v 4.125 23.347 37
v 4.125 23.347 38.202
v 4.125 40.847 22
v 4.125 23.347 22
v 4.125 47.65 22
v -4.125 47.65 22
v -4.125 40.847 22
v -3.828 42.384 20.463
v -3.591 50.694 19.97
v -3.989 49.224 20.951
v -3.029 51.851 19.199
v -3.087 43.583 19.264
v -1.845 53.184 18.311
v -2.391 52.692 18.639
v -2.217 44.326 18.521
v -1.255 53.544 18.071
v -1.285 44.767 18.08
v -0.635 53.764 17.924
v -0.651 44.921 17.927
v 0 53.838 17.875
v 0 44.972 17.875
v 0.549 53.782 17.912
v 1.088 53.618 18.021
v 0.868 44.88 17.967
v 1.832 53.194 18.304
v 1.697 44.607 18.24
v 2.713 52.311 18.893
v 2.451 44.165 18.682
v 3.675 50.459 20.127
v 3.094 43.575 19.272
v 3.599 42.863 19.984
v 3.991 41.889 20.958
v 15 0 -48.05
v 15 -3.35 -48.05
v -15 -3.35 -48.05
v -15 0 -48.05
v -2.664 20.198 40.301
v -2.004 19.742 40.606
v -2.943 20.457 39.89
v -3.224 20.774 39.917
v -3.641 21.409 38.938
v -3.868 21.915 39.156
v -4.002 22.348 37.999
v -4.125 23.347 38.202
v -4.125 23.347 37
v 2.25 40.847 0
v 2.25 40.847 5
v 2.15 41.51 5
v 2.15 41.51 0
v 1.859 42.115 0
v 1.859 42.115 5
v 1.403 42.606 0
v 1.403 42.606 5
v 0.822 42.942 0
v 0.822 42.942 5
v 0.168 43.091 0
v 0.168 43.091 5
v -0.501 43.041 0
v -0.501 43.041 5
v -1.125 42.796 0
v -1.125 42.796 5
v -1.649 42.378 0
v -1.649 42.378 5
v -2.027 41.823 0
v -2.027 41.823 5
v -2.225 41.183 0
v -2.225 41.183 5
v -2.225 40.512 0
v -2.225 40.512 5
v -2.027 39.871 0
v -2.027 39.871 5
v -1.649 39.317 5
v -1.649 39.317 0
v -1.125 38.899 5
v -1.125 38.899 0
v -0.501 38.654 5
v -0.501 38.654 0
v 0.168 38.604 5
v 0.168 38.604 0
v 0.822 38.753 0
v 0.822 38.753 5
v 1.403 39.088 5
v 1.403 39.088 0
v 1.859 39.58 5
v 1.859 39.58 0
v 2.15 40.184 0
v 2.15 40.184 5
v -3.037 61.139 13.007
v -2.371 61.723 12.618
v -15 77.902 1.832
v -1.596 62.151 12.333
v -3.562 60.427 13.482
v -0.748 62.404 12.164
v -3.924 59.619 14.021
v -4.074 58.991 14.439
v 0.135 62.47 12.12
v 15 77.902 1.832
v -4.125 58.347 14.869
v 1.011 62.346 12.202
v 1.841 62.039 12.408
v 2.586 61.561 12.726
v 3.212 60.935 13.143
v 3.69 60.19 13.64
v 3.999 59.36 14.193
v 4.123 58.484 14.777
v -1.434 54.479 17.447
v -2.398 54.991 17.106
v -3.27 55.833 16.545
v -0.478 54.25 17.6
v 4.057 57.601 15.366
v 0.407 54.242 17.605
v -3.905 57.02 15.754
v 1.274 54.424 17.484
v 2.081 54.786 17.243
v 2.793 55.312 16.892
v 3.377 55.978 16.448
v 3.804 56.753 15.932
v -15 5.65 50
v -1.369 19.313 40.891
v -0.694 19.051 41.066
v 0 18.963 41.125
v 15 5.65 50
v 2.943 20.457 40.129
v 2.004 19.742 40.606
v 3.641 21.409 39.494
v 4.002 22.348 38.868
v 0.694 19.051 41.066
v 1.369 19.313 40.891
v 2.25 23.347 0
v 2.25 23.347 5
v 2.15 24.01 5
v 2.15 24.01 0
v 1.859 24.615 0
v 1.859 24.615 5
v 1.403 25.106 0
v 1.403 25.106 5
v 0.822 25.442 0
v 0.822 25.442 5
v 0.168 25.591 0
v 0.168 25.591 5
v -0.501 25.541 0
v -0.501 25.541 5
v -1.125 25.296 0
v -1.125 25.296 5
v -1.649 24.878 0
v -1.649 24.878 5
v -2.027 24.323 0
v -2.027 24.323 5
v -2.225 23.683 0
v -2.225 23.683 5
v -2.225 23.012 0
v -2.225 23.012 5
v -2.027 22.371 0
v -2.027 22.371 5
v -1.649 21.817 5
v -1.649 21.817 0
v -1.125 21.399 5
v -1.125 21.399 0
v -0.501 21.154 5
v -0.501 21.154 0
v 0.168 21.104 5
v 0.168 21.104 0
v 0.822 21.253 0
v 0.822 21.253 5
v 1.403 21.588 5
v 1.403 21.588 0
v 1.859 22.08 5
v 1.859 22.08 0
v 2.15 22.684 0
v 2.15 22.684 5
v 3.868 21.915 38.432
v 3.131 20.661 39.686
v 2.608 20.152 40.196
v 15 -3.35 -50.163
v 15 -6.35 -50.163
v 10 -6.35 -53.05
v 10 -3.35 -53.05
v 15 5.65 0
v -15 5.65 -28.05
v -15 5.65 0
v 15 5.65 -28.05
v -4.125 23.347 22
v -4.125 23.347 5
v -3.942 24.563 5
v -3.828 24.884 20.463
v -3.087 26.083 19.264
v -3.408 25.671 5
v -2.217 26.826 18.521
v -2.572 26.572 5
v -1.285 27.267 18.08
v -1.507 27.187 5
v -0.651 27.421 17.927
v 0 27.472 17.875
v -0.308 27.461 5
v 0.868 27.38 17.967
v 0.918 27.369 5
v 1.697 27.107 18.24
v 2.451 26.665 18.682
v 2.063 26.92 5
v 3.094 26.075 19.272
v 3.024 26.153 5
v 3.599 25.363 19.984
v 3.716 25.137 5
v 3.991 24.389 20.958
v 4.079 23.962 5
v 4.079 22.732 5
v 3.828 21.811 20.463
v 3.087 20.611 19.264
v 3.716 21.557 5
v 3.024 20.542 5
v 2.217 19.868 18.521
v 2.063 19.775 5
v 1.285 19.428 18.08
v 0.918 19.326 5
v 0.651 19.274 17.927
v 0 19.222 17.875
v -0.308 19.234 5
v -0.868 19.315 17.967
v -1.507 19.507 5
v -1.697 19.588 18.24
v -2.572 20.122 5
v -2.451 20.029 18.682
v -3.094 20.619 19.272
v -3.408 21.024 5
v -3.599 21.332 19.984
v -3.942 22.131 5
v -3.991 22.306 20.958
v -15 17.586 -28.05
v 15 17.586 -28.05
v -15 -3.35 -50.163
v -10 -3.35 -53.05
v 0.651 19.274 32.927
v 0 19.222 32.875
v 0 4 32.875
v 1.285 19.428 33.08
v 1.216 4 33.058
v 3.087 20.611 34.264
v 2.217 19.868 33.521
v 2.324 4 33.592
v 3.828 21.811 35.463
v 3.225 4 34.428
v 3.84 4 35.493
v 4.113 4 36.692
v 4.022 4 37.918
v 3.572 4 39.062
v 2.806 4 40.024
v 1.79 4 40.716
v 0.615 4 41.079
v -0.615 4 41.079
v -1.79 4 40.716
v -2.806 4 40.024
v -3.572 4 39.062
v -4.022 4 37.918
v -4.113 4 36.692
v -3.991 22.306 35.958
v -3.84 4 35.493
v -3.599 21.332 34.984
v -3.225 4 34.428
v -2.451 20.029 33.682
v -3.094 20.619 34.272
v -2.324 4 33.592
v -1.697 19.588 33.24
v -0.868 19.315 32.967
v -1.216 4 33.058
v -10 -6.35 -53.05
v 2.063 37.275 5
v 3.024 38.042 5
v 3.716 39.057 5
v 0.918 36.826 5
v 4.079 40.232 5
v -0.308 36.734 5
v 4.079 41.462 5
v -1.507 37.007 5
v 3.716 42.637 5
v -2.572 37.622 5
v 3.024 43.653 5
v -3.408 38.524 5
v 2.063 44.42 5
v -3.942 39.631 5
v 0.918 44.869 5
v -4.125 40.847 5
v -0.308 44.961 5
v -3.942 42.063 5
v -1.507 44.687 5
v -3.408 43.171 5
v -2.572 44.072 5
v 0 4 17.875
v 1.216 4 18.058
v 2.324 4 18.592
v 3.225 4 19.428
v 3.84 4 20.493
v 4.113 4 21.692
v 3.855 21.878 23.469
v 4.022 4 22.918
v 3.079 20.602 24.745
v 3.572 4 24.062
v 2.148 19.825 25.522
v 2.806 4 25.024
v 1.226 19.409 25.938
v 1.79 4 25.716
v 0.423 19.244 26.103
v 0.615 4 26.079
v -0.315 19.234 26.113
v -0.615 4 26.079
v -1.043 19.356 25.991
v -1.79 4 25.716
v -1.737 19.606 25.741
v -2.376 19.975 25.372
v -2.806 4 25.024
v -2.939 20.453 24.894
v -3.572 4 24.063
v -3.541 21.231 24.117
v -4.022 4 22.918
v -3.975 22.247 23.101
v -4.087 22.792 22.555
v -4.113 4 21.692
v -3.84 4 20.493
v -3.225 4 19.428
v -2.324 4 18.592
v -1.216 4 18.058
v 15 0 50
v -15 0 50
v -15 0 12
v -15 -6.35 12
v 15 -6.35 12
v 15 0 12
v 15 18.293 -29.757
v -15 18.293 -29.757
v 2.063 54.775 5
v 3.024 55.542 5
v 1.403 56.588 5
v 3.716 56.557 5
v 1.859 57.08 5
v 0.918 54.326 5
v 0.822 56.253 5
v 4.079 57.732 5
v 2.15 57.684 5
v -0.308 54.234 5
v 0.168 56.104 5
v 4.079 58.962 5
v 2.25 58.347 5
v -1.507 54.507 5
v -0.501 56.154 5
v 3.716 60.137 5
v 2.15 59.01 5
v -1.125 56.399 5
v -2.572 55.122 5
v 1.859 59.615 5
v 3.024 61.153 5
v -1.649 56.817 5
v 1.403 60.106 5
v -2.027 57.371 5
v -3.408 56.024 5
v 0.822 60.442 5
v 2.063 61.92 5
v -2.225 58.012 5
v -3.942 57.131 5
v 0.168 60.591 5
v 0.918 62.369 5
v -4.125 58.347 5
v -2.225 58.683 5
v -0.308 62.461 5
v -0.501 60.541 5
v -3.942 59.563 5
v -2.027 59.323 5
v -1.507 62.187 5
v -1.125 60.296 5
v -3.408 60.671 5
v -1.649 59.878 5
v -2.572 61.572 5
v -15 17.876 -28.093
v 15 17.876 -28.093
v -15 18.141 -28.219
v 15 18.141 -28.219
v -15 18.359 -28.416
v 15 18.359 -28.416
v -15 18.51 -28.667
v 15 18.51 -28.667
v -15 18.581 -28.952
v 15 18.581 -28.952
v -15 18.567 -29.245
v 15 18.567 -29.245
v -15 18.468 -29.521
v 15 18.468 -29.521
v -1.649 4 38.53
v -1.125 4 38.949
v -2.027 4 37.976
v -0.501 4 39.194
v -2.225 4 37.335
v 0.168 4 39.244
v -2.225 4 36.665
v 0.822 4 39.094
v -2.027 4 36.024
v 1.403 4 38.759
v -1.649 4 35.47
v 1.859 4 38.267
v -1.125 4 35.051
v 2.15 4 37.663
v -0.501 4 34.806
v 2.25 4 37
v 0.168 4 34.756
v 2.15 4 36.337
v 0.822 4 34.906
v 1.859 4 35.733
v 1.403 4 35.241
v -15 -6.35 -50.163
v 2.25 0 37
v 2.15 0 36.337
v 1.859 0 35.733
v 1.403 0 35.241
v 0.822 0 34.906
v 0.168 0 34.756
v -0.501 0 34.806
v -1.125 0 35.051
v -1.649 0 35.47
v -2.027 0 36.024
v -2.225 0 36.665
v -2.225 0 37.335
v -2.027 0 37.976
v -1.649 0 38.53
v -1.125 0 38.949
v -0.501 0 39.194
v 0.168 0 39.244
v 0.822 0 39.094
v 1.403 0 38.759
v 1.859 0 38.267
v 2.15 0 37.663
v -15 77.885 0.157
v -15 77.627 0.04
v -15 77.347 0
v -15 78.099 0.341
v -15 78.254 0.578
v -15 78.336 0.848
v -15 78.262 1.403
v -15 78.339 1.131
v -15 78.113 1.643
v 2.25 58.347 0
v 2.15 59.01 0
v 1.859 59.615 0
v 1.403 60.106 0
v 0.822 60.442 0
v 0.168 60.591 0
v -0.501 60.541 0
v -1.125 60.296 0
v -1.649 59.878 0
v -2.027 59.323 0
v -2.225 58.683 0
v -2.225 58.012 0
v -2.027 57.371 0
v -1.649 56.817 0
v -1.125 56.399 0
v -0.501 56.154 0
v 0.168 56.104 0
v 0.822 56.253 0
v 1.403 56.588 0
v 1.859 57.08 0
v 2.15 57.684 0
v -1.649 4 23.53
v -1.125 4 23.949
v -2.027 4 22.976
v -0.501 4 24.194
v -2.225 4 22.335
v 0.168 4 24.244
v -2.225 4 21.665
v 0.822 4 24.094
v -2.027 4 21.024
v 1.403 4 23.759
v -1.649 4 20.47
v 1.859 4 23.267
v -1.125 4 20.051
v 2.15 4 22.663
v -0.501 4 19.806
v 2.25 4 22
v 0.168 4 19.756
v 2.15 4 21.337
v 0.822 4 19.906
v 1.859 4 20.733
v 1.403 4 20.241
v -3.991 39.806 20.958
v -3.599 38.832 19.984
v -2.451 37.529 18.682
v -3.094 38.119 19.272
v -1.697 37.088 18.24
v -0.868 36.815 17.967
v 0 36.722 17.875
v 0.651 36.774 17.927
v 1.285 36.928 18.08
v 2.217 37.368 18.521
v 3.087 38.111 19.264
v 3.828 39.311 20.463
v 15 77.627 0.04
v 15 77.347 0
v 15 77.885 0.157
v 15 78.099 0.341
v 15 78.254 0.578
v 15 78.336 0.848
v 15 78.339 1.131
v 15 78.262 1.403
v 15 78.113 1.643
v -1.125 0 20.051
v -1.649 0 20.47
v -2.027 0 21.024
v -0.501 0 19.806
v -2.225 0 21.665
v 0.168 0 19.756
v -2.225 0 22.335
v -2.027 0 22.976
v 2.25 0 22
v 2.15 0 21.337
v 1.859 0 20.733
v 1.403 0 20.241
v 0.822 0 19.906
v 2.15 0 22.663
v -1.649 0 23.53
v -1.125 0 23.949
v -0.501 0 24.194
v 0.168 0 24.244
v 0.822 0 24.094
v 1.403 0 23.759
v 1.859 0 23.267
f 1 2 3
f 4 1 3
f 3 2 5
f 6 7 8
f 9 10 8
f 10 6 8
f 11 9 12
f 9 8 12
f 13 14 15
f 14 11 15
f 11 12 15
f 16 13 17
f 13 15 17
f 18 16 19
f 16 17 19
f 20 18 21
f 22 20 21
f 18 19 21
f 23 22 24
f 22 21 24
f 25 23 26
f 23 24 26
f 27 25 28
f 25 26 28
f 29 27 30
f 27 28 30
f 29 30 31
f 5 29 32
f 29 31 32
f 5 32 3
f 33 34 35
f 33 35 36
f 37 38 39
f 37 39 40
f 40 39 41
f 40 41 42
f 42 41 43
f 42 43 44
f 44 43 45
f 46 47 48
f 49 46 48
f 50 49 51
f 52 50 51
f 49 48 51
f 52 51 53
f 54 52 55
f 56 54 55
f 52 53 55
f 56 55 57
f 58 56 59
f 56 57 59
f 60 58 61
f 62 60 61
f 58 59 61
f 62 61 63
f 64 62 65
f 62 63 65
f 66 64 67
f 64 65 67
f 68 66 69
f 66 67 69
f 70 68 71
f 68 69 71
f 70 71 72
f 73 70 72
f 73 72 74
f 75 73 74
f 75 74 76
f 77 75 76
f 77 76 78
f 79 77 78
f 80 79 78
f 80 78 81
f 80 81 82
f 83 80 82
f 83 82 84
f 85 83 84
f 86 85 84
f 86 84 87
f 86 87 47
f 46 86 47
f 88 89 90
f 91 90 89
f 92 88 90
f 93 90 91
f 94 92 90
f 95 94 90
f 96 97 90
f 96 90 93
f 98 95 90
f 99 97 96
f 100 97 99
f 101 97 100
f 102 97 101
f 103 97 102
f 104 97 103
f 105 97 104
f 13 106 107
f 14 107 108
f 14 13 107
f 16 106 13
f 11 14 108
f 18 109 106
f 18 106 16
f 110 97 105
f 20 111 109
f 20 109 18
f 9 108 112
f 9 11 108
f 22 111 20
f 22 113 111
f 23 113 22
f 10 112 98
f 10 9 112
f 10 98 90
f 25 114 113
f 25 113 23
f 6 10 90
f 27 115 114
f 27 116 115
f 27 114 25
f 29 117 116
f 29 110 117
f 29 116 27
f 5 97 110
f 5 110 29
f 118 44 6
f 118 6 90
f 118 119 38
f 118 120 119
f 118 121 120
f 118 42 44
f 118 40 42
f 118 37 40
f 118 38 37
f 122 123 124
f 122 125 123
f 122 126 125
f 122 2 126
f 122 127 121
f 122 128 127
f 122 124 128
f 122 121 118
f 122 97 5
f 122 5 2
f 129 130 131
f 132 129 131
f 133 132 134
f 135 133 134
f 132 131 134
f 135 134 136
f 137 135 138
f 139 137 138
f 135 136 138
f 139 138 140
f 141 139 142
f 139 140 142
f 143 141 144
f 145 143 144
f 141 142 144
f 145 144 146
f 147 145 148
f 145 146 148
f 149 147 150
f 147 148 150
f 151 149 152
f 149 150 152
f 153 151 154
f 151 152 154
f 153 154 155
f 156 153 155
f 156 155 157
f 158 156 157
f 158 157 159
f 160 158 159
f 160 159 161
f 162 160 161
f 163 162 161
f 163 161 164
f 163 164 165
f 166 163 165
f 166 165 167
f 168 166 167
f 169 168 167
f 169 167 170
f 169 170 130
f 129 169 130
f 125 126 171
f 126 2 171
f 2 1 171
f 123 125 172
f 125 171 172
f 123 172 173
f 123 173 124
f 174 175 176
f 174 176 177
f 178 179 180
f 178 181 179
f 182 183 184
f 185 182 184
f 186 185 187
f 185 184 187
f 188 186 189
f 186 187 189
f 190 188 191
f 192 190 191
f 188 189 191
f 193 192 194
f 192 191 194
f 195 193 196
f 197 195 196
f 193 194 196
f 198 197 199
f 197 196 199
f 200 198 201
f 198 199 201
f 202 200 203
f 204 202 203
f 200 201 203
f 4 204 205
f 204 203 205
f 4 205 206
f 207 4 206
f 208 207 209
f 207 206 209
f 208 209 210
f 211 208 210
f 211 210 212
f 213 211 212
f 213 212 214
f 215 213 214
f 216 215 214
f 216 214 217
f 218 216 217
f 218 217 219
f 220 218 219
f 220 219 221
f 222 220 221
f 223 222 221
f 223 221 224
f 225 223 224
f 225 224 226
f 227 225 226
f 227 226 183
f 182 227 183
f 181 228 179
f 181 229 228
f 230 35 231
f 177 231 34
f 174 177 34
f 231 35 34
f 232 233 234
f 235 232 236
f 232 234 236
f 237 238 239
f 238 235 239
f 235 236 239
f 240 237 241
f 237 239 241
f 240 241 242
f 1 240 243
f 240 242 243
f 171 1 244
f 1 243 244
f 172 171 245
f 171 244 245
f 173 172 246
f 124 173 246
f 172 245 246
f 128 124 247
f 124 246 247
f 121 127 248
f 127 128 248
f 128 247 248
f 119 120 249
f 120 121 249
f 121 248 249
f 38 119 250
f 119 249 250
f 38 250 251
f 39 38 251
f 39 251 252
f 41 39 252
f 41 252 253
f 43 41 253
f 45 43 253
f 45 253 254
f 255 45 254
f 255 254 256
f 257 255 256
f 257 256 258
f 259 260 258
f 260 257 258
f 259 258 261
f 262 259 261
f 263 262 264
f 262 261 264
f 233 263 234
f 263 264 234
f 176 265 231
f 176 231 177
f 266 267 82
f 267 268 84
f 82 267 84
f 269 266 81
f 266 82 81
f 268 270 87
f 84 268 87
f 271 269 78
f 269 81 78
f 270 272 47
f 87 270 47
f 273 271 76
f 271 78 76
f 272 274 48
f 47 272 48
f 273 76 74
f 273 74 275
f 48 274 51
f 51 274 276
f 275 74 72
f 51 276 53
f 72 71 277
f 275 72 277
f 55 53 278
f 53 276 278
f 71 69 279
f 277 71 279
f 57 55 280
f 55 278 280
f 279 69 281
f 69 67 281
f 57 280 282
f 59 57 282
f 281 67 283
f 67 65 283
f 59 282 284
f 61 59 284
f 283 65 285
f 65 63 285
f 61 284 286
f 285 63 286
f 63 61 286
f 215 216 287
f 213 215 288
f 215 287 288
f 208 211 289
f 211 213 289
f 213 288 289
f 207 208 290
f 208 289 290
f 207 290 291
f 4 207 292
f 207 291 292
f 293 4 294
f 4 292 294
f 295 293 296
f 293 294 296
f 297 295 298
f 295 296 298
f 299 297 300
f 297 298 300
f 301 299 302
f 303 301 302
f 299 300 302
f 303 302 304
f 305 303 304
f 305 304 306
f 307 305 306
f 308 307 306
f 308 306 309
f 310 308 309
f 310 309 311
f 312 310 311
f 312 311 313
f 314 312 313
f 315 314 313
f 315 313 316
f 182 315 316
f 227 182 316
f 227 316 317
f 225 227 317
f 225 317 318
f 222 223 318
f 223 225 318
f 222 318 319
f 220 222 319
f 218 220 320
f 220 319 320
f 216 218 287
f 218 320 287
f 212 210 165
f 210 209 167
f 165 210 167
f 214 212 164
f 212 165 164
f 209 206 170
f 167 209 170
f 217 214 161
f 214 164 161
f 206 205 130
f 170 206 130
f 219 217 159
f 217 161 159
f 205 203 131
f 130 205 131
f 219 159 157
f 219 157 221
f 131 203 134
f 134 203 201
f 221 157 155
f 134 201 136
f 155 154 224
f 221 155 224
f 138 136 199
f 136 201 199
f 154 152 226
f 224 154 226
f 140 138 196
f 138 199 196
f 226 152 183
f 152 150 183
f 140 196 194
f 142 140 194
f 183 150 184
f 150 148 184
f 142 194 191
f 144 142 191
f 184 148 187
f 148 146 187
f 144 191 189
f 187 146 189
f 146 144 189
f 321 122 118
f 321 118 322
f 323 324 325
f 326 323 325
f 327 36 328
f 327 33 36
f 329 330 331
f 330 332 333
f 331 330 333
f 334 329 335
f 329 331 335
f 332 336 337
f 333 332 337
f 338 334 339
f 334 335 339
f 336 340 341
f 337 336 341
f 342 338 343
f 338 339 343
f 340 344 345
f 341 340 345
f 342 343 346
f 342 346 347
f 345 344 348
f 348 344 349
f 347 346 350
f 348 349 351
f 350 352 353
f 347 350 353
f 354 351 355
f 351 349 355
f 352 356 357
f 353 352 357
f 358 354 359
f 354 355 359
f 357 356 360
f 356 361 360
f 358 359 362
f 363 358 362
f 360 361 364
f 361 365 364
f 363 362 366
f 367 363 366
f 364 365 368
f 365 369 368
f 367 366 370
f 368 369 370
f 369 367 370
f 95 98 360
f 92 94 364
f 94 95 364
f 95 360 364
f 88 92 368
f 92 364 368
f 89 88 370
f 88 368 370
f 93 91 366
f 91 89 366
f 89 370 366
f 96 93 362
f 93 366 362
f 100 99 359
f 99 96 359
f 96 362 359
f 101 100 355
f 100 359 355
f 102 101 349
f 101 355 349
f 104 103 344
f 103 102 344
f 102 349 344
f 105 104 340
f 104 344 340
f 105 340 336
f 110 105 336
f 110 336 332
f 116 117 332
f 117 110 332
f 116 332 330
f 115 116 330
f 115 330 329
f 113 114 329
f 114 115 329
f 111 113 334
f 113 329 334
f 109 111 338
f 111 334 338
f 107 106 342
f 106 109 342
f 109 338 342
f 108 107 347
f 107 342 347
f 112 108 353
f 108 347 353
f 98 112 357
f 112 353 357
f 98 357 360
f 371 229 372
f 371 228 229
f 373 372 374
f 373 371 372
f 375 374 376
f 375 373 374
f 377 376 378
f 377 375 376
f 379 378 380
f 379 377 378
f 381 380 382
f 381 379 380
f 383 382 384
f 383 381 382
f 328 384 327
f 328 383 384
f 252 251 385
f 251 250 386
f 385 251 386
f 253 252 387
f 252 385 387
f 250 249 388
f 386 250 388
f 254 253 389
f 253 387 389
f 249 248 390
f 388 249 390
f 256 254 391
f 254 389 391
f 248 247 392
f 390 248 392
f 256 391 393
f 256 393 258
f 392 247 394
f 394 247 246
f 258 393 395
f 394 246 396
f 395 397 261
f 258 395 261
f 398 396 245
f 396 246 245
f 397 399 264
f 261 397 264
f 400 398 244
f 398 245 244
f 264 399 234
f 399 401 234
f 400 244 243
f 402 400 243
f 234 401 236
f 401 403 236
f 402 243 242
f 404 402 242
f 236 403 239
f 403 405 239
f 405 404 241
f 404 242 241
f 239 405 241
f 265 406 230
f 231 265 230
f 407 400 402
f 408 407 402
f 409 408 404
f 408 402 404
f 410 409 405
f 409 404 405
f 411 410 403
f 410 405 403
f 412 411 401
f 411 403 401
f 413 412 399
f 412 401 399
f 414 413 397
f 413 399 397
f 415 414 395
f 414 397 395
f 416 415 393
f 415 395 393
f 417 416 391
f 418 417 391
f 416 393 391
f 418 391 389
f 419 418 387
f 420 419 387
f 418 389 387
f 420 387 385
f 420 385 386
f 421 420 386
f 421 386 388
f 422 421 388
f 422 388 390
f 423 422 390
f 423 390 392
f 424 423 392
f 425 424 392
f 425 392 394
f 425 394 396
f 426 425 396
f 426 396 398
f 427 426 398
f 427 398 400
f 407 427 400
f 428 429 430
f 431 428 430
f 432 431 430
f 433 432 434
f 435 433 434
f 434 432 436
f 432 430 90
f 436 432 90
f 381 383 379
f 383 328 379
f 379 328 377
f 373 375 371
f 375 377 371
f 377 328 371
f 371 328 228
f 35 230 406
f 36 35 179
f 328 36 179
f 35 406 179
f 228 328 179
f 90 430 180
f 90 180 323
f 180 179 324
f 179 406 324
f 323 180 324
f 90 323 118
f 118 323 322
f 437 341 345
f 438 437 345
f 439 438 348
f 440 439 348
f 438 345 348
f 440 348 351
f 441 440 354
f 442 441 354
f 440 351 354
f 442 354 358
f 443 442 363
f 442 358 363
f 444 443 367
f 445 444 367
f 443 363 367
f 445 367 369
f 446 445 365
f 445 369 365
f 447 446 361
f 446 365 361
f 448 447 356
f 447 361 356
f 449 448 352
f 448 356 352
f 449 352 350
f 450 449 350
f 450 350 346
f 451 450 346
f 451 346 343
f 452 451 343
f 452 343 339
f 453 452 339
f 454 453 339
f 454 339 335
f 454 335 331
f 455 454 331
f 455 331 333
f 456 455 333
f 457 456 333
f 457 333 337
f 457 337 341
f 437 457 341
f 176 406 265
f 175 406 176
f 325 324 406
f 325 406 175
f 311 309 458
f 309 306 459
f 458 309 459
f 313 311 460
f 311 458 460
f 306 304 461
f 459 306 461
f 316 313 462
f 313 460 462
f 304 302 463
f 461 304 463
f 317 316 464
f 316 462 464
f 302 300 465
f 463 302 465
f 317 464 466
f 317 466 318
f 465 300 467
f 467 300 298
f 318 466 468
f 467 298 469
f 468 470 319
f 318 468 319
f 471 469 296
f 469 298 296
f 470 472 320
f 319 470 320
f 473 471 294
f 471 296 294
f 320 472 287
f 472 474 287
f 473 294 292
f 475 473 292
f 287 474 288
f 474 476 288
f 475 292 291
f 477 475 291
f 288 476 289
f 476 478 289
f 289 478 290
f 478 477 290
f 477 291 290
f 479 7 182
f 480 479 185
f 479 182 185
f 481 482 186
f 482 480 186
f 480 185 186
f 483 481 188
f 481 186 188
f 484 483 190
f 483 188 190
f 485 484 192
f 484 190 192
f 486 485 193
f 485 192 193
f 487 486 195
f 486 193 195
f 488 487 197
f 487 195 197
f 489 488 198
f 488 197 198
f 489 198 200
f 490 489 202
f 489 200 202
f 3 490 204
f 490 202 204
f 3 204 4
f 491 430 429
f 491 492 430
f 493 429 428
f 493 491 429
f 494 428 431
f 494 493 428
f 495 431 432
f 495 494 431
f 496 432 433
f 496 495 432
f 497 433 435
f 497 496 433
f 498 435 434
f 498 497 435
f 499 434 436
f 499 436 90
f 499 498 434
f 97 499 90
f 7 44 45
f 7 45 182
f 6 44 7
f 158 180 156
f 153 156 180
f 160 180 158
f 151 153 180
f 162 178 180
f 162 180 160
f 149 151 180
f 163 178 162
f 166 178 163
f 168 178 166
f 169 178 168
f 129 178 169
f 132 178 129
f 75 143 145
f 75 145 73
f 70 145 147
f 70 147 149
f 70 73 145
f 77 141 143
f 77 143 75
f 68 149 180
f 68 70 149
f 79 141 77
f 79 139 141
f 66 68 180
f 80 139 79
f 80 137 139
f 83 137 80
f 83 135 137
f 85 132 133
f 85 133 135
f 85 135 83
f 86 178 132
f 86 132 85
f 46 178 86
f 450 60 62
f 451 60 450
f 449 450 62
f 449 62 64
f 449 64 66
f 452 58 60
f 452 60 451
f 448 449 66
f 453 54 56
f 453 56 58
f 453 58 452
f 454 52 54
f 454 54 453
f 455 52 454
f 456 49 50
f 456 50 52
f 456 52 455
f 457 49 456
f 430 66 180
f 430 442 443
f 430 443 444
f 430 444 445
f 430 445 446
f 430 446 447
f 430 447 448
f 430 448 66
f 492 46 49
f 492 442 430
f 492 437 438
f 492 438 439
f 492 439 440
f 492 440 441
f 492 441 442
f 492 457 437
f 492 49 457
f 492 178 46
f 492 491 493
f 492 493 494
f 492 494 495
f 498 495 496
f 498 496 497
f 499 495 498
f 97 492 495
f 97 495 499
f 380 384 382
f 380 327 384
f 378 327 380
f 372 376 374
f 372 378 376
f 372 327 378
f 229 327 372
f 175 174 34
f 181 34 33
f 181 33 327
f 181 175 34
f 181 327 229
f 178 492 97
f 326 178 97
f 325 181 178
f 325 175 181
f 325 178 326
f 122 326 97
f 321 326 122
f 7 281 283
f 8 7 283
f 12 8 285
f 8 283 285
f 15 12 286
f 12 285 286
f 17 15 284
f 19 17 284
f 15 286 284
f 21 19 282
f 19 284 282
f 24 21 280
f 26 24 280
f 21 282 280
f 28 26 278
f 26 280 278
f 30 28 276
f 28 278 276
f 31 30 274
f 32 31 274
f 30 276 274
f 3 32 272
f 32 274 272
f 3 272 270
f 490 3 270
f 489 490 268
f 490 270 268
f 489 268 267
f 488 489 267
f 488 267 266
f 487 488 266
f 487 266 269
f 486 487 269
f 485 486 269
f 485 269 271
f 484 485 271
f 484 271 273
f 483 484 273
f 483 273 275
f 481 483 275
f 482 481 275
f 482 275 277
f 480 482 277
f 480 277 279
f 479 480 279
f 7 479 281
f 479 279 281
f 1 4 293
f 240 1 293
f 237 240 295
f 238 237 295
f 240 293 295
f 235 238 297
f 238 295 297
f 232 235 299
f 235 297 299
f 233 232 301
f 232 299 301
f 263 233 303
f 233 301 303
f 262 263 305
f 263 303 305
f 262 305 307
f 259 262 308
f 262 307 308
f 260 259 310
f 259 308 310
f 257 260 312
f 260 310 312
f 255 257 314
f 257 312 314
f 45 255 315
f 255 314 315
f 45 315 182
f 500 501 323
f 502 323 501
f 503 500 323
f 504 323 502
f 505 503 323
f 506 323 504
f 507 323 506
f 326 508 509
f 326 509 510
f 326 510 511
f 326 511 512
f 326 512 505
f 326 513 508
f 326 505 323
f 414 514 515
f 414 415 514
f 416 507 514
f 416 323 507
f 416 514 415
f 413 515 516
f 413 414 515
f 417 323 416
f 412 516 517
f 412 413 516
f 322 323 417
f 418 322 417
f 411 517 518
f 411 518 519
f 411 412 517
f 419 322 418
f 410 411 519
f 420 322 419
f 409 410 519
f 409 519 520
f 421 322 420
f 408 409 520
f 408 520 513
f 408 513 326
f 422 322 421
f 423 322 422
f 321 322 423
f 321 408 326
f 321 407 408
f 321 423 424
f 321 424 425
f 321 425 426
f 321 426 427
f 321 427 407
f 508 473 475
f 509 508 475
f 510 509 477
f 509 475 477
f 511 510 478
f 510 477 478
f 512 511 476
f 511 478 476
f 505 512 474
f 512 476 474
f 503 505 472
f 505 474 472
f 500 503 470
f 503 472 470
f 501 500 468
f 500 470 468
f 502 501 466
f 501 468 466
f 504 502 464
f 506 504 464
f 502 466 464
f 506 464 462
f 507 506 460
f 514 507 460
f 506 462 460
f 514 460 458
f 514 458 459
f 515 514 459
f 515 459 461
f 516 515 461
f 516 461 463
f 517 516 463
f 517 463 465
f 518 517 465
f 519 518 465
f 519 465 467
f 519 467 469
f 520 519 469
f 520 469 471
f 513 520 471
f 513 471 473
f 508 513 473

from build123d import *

# Parameters (mm, degrees)
BOSS_EXTRUDE1_DEPTH  = 15
FILLET1_R            = 1
SKETCH6_W            = 30
SKETCH6_H            = 38
CUT_EXTRUDE2_DEPTH   = 6.35
M4_CLEARANCE_HOLE1_D = 4.5
CUT_EXTRUDE3_START   = -5
SKETCH11_R           = 4.125
CUT_EXTRUDE3_DEPTH   = 40.35
M4_CLEARANCE_HOLE2_D = 4.5
CUT_EXTRUDE4_START   = -4
SKETCH15_R           = 4.125
CUT_EXTRUDE4_DEPTH   = 78.35
SKETCH16_W           = 22.054388556
SKETCH16_H           = 29.268630824
CUT_EXTRUDE6_DEPTH   = 8.25
SKETCH18_W           = 30
SKETCH18_H           = 5
BOSS_EXTRUDE2_DEPTH  = 3
CHAMFER1_SIZE        = 5
CHAMFER1_SIZE2       = 2.886751346


with BuildPart() as part:
    # Sketch2 → Boss-Extrude1 (new, symmetric)
    with BuildSketch(Plane(origin=(0, 0, 0), x_dir=(0, 0, -1), z_dir=(1, 0, 0))):
        Polygon((0, 5.65), (0, 80.65), (-50, 5.65), (-50, 0), (-50, -6.35), (48.05, -6.35), (48.05, 0), (28.05, 20), (28.05, 5.65), align=None)
    extrude(amount=BOSS_EXTRUDE1_DEPTH, both=True)

    # Fillet1
    fillet1_edges = [part.edges().sort_by_distance(p)[0] for p in [
        (0, 80.65, 0),
        (0, 20, -28.05),
    ]]
    fillet(fillet1_edges, radius=FILLET1_R)

    # Sketch6 → Cut-Extrude2 (cut)
    with BuildSketch(Plane.XZ.offset(6.35)):
        with Locations((0, 31)):
            Rectangle(SKETCH6_W, SKETCH6_H)
    extrude(amount=-CUT_EXTRUDE2_DEPTH, mode=Mode.SUBTRACT)

    # M4 Clearance Hole1 (through all)
    with Locations(Plane(origin=(0, 0, 0), x_dir=(-1, 0, 0), z_dir=(0, 0, -1))):
        with Locations((0, 58.347224362), (0, 40.847224362), (0, 23.347224362)):
            Hole(M4_CLEARANCE_HOLE1_D / 2)

    # Sketch11 → Cut-Extrude3 (cut)
    with BuildSketch(Plane(origin=(0, 0, 0), x_dir=(-1, 0, 0), z_dir=(0, 0, -1)).offset(CUT_EXTRUDE3_START)):
        with Locations((0, 58.347224362)):
            Circle(SKETCH11_R)
        with Locations((0, 40.847224362)):
            Circle(SKETCH11_R)
        with Locations((0, 23.347224362)):
            Circle(SKETCH11_R)
    extrude(amount=-CUT_EXTRUDE3_DEPTH, mode=Mode.SUBTRACT)

    # M4 Clearance Hole2 (through all)
    with Locations(Plane(origin=(0, 0, 0), x_dir=(-1, 0, 0), z_dir=(0, -1, 0))):
        with Locations((0, -37), (0, -22)):
            Hole(M4_CLEARANCE_HOLE2_D / 2)

    # Sketch15 → Cut-Extrude4 (cut)
    with BuildSketch(Plane.XZ.offset(CUT_EXTRUDE4_START)):
        with Locations(Location((0, 37, 0), (0, 0, 270))):
            Circle(SKETCH15_R)
        with Locations(Location((0, 22, 0), (0, 0, 270))):
            Circle(SKETCH15_R)
    extrude(amount=-CUT_EXTRUDE4_DEPTH, mode=Mode.SUBTRACT)

    # Sketch16 → Cut-Extrude6 (cut)
    with BuildSketch(Plane(origin=(-4.125, 0, 0), x_dir=(0, 0, -1), z_dir=(1, 0, 0))):
        with Locations((-33.027194278, 37.981539774)):
            Rectangle(SKETCH16_W, SKETCH16_H)
    extrude(amount=CUT_EXTRUDE6_DEPTH, mode=Mode.SUBTRACT)

    # Sketch18 → Boss-Extrude2 (add)
    with BuildSketch(Plane.XZ.offset(6.35)):
        with Locations((0, -50.55)):
            Rectangle(SKETCH18_W, SKETCH18_H)
    extrude(amount=-BOSS_EXTRUDE2_DEPTH)

    # Chamfer1
    chamfer1_edges = [part.edges().sort_by_distance(p)[0] for p in [
        (-15, -4.85, -53.05),
        (15, -4.85, -53.05),
    ]]
    chamfer1_side = [part.faces().sort_by_distance(p)[0] for p in [
        (0, -4.85, -53.05),
    ]]
    chamfer(chamfer1_edges, length=CHAMFER1_SIZE, length2=CHAMFER1_SIZE2, reference=chamfer1_side[0])


solid = part.part
